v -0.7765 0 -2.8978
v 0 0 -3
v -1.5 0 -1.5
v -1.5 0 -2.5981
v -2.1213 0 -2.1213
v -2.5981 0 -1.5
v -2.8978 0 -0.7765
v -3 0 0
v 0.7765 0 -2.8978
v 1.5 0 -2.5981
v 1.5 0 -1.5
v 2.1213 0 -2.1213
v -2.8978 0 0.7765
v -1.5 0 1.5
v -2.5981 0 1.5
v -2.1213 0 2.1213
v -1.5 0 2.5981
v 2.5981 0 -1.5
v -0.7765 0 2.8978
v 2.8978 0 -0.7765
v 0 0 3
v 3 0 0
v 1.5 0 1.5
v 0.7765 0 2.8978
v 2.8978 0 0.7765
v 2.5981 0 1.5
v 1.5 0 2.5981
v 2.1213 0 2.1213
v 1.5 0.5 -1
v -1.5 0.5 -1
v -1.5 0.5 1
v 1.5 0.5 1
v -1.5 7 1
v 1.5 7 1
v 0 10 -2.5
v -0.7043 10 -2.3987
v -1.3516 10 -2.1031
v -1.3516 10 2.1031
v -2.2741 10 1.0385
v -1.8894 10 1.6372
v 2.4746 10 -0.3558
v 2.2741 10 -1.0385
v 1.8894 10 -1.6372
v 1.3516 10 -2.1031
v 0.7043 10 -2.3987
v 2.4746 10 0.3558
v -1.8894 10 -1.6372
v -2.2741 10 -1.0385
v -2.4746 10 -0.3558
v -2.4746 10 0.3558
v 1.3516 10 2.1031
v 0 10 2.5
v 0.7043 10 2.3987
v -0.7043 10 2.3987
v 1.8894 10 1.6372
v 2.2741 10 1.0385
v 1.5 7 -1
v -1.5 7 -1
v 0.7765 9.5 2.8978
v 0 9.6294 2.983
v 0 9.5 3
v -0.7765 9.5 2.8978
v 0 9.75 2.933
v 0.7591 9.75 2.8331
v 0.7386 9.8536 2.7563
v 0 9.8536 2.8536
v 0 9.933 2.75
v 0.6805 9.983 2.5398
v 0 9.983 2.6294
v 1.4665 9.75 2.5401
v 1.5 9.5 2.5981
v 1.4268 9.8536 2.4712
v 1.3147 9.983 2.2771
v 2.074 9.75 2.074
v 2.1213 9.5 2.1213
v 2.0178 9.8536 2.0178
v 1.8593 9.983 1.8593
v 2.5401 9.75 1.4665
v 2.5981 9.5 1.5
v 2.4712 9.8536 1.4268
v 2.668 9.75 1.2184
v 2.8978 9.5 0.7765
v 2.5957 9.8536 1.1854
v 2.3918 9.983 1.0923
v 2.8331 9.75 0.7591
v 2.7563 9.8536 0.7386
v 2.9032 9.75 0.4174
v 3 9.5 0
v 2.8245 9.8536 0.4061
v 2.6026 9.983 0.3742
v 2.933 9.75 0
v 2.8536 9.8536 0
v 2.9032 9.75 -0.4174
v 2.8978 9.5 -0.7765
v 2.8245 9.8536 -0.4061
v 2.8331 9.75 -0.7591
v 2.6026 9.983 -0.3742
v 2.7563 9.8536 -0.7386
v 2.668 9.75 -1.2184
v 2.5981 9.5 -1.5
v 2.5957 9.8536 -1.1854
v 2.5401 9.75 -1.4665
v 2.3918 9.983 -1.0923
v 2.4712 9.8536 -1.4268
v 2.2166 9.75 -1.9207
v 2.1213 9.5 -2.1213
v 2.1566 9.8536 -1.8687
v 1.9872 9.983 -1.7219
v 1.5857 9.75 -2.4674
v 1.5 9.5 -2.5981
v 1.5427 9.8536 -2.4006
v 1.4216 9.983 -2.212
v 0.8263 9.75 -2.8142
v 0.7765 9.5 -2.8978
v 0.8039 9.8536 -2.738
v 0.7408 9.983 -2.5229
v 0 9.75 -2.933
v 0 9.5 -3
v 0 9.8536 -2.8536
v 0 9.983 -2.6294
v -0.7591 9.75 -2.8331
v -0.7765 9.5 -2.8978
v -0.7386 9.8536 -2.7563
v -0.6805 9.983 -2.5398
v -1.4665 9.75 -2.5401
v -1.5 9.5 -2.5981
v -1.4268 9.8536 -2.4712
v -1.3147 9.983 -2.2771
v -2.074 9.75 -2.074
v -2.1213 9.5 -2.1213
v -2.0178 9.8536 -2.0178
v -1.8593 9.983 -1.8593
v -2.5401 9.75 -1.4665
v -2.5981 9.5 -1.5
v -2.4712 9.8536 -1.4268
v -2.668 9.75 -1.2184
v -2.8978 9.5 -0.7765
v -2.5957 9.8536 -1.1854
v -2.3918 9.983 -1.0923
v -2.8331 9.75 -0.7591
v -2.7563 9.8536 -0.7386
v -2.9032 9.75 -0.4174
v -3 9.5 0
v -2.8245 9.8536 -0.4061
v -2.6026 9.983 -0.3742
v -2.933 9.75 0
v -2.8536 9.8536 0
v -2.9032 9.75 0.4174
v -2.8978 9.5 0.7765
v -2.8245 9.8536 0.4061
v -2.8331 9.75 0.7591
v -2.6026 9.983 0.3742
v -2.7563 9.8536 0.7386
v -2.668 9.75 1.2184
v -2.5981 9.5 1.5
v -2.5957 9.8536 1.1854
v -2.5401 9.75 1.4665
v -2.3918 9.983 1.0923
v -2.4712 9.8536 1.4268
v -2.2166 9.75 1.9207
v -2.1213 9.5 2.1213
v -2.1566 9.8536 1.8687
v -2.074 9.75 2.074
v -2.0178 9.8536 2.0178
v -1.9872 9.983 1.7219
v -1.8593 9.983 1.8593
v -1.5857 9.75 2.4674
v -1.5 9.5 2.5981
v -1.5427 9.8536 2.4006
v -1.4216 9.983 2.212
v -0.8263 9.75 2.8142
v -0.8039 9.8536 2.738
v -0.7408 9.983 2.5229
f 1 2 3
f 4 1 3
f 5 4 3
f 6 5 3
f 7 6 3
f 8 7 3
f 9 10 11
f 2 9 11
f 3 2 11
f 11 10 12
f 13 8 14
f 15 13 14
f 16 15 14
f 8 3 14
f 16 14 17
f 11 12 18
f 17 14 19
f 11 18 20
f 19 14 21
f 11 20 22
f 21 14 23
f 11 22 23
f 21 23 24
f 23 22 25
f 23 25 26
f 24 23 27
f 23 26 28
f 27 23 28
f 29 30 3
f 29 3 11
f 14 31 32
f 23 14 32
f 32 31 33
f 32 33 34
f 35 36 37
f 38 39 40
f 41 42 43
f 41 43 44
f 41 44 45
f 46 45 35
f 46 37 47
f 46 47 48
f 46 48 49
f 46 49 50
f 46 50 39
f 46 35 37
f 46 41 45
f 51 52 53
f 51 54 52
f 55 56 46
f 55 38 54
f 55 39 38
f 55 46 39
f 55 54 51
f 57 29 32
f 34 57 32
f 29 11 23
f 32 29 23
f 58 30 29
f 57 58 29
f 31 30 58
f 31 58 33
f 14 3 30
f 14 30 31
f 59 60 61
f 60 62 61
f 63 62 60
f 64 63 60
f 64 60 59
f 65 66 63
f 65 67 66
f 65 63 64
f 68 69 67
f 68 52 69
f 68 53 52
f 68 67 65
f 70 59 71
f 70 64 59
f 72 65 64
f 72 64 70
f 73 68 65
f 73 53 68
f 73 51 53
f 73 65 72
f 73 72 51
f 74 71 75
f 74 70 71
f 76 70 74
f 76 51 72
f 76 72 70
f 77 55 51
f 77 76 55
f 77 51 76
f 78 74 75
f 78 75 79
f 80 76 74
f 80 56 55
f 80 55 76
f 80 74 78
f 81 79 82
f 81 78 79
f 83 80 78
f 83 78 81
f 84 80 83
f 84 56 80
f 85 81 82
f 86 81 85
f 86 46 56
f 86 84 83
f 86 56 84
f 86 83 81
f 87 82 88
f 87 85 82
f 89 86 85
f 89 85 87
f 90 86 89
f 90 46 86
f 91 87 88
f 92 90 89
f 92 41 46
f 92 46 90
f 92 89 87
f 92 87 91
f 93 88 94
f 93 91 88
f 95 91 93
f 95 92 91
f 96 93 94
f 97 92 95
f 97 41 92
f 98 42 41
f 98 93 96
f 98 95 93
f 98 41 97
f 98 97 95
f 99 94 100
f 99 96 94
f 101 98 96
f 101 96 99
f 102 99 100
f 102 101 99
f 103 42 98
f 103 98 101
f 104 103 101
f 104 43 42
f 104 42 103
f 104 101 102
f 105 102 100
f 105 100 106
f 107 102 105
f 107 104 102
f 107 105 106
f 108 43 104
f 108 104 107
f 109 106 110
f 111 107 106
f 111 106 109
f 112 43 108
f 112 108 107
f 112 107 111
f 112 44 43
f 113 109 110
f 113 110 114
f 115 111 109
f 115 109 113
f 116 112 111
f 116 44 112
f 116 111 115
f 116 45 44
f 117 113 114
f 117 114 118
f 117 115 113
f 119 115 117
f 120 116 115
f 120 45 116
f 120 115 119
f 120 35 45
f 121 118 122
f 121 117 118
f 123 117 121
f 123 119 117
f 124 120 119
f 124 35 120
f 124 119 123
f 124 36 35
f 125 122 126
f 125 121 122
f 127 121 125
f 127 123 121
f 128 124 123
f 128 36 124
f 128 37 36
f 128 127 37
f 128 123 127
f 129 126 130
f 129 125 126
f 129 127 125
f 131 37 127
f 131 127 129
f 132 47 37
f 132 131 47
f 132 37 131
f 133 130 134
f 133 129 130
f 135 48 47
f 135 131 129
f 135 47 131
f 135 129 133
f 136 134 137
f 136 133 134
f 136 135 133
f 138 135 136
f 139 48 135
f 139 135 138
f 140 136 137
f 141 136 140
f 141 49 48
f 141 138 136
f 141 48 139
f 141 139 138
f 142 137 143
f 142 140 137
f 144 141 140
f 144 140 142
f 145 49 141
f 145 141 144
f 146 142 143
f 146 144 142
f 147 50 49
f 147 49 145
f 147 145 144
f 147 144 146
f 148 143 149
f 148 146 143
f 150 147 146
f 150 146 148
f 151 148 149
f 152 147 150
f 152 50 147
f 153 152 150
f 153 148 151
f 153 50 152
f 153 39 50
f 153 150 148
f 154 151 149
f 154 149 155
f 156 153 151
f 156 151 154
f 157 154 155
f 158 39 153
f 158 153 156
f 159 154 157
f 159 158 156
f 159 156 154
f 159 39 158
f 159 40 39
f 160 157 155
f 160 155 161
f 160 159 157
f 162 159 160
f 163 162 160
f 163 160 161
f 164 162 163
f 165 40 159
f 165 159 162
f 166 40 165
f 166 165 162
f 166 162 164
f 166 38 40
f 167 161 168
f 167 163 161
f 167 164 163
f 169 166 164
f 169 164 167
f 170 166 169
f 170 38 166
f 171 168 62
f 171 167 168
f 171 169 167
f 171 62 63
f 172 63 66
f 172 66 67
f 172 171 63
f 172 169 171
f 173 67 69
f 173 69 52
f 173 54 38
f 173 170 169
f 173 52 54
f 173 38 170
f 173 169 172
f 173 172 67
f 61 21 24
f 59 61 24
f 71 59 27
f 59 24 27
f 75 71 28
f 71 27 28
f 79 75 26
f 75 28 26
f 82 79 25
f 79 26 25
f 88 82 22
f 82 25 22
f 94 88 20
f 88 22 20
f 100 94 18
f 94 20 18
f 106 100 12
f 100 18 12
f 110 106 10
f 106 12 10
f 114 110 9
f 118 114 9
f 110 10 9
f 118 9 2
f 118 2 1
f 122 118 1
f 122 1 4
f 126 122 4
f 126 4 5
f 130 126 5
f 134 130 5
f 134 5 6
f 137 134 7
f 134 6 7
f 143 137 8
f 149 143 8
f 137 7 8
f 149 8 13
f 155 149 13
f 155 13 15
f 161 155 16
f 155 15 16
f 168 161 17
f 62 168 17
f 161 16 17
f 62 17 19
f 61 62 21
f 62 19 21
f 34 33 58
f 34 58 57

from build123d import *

# Parameters (mm, degrees)
SKETCH1_R           = 3
BOSS_EXTRUDE1_DEPTH = 10
SKETCH2_W           = 3
SKETCH2_H           = 2
CUT_EXTRUDE1_DEPTH  = 7
CHAMFER1_SIZE       = 0.5
FILLET1_R           = 0.5


with BuildPart() as part:
    # Sketch1 → Boss-Extrude1 (new body)
    with BuildSketch(Plane(origin=(0, 0, 0), x_dir=(1, 0, 0), z_dir=(0, 1, 0))):
        with Locations(Location((0, 0, 0), (0, 0, 270))):
            Circle(SKETCH1_R)
    extrude(amount=BOSS_EXTRUDE1_DEPTH)

    # Sketch2 → Cut-Extrude1 (cut)
    with BuildSketch(Plane.XZ):
        Rectangle(SKETCH2_W, SKETCH2_H)
    extrude(amount=-CUT_EXTRUDE1_DEPTH, mode=Mode.SUBTRACT)

    # Chamfer1
    chamfer1_edges = [part.edges().sort_by_distance(p)[0] for p in [
        (0, 0, -1),
        (0, 0, 1),
    ]]
    chamfer(chamfer1_edges, length=CHAMFER1_SIZE)

    # Fillet1
    fillet1_edges = [part.edges().sort_by_distance(p)[0] for p in [
        (0, 10, -3),
    ]]
    fillet(fillet1_edges, radius=FILLET1_R)


solid = part.part
